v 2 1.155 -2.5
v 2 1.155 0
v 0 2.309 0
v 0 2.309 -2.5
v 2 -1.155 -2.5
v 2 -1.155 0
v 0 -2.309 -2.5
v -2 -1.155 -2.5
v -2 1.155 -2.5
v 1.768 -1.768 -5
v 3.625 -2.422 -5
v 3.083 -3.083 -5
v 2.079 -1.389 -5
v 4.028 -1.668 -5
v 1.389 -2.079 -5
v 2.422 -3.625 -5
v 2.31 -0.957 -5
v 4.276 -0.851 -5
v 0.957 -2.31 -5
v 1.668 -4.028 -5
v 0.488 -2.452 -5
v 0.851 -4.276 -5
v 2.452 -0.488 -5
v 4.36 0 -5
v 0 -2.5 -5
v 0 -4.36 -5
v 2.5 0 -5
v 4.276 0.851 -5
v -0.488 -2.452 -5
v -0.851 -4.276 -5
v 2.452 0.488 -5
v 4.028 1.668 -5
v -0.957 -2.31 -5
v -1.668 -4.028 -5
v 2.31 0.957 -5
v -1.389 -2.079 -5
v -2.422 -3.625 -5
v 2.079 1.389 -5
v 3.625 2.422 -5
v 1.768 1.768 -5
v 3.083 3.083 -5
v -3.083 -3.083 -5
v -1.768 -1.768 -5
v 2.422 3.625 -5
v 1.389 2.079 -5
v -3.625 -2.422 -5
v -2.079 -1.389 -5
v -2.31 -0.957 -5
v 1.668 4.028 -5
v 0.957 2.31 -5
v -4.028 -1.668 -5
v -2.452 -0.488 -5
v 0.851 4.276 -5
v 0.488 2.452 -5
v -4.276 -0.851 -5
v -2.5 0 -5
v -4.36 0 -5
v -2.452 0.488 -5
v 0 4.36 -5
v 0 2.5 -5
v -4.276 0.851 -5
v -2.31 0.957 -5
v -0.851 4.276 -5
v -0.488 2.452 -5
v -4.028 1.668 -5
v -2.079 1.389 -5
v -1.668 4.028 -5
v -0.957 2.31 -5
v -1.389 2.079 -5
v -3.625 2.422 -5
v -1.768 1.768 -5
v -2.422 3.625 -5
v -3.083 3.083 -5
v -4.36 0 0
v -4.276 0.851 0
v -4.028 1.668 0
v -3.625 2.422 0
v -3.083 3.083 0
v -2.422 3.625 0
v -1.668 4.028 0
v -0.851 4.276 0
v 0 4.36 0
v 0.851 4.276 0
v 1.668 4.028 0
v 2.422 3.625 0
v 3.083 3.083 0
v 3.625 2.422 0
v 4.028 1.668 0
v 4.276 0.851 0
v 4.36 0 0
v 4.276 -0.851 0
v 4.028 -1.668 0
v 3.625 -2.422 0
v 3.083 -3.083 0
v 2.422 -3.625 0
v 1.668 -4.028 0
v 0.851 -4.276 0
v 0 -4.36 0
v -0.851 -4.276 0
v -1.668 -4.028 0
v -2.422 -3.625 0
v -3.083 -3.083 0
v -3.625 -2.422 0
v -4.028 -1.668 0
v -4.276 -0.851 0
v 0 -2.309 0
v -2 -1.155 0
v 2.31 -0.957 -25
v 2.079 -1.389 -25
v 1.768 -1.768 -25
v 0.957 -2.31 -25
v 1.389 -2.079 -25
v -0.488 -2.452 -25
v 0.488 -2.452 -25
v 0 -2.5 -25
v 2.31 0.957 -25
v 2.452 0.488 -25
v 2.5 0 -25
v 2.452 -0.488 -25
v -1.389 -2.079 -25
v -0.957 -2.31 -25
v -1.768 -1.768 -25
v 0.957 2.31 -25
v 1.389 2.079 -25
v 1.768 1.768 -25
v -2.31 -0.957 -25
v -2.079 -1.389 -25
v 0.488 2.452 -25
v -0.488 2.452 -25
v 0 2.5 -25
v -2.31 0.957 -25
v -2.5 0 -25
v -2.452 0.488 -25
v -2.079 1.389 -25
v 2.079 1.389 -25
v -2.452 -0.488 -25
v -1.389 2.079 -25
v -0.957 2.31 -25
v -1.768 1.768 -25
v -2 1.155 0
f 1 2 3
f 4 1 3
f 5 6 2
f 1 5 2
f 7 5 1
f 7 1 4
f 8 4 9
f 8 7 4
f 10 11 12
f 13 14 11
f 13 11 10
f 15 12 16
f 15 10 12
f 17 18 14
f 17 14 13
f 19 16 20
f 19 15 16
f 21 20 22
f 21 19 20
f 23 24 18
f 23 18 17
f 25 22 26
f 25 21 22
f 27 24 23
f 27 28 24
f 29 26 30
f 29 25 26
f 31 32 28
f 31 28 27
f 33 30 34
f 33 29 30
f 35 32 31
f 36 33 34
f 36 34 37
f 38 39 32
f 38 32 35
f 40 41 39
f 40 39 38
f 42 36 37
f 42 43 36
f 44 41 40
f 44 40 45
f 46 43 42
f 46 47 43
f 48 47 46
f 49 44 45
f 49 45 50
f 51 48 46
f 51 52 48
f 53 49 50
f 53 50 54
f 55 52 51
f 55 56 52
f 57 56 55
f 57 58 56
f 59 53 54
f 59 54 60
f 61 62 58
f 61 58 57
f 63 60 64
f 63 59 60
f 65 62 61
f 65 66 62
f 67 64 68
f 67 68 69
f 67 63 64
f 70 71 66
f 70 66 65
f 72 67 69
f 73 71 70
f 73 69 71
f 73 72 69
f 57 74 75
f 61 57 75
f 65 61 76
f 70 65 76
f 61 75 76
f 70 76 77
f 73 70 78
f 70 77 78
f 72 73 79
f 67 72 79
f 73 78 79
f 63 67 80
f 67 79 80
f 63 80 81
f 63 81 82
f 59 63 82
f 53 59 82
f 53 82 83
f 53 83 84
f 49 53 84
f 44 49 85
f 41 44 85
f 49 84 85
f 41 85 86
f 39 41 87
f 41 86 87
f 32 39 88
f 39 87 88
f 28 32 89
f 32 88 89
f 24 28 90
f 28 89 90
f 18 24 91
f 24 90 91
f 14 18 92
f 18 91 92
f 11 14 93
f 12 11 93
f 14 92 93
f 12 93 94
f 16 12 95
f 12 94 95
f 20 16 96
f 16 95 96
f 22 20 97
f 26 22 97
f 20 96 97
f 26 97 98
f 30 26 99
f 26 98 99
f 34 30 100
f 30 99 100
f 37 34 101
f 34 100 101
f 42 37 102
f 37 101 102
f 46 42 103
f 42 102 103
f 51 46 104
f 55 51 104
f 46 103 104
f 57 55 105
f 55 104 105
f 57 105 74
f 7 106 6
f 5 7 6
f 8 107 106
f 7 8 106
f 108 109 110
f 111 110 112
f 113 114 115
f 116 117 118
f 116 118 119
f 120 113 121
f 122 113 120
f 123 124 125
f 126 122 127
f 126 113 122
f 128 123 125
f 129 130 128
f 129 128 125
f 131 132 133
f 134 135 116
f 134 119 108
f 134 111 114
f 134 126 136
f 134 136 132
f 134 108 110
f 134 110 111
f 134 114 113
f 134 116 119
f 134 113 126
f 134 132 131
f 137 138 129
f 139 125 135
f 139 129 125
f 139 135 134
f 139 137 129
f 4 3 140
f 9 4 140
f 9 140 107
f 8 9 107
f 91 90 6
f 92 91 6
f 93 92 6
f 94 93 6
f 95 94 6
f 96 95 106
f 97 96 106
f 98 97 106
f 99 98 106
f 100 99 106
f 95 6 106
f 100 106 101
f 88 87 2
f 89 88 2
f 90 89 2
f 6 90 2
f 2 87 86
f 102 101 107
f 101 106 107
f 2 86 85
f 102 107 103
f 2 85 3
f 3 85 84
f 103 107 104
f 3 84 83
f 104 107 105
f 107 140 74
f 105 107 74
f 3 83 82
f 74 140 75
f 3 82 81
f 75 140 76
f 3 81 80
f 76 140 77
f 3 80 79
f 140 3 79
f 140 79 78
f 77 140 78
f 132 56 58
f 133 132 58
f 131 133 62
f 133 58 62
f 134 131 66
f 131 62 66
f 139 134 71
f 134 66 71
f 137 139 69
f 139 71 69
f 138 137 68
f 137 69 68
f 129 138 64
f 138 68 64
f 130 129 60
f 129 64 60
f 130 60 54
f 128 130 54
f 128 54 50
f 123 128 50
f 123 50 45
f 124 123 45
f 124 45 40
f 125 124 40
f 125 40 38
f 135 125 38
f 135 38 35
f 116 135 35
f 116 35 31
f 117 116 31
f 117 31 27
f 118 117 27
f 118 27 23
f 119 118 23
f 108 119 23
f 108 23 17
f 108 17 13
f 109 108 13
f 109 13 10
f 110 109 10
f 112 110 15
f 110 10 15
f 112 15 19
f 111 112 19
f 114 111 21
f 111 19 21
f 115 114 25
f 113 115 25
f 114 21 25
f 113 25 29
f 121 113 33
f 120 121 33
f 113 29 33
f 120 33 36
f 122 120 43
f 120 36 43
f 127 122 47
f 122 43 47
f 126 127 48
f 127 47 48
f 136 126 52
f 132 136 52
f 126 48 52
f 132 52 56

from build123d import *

# Parameters (mm, degrees)
CYLINDER019_R                      = 2.5
CYLINDER019_DEPTH                  = 25
CYLINDER018_R                      = 4.36
CYLINDER018_DEPTH                  = 5
FUSION001018017020_PLACEMENT_ANGLE = 180
POCKET002018004005_DEPTH           = 2.5


with BuildPart() as cylinder019:
    # Cylinder019 → Cylinder019 (new body)
    with BuildSketch(Plane.XY):
        Circle(CYLINDER019_R)
    extrude(amount=CYLINDER019_DEPTH)


with BuildPart() as zylinderkopfschraube_m5x20_isk:
    # Cylinder018 → Cylinder018 (new body)
    with BuildSketch(Plane.XY):
        Circle(CYLINDER018_R)
    extrude(amount=CYLINDER018_DEPTH)

    # Fusion001018017020: union Cylinder019
    add(cylinder019.part)


with BuildPart() as zylinderkopfschraube_m5x20_isk_1:
    # Fusion001018017020 placement: moved
    add(zylinderkopfschraube_m5x20_isk.part.rotate(Axis((0, 0, 0), (0, 1, 0)), FUSION001018017020_PLACEMENT_ANGLE))

    # Sketch022 → Pocket002018004005 (cut)
    with BuildSketch(Plane(origin=(0, 0, 0), x_dir=(-1, 0, 0), z_dir=(0, 0, 1))):
        Polygon((2, -1.154701), (2, 1.154701), (0, 2.309401), (-2, 1.154701), (-2, -1.154701), (0, -2.309401), align=None)
    extrude(amount=-POCKET002018004005_DEPTH, mode=Mode.SUBTRACT)


solid = zylinderkopfschraube_m5x20_isk_1.part
